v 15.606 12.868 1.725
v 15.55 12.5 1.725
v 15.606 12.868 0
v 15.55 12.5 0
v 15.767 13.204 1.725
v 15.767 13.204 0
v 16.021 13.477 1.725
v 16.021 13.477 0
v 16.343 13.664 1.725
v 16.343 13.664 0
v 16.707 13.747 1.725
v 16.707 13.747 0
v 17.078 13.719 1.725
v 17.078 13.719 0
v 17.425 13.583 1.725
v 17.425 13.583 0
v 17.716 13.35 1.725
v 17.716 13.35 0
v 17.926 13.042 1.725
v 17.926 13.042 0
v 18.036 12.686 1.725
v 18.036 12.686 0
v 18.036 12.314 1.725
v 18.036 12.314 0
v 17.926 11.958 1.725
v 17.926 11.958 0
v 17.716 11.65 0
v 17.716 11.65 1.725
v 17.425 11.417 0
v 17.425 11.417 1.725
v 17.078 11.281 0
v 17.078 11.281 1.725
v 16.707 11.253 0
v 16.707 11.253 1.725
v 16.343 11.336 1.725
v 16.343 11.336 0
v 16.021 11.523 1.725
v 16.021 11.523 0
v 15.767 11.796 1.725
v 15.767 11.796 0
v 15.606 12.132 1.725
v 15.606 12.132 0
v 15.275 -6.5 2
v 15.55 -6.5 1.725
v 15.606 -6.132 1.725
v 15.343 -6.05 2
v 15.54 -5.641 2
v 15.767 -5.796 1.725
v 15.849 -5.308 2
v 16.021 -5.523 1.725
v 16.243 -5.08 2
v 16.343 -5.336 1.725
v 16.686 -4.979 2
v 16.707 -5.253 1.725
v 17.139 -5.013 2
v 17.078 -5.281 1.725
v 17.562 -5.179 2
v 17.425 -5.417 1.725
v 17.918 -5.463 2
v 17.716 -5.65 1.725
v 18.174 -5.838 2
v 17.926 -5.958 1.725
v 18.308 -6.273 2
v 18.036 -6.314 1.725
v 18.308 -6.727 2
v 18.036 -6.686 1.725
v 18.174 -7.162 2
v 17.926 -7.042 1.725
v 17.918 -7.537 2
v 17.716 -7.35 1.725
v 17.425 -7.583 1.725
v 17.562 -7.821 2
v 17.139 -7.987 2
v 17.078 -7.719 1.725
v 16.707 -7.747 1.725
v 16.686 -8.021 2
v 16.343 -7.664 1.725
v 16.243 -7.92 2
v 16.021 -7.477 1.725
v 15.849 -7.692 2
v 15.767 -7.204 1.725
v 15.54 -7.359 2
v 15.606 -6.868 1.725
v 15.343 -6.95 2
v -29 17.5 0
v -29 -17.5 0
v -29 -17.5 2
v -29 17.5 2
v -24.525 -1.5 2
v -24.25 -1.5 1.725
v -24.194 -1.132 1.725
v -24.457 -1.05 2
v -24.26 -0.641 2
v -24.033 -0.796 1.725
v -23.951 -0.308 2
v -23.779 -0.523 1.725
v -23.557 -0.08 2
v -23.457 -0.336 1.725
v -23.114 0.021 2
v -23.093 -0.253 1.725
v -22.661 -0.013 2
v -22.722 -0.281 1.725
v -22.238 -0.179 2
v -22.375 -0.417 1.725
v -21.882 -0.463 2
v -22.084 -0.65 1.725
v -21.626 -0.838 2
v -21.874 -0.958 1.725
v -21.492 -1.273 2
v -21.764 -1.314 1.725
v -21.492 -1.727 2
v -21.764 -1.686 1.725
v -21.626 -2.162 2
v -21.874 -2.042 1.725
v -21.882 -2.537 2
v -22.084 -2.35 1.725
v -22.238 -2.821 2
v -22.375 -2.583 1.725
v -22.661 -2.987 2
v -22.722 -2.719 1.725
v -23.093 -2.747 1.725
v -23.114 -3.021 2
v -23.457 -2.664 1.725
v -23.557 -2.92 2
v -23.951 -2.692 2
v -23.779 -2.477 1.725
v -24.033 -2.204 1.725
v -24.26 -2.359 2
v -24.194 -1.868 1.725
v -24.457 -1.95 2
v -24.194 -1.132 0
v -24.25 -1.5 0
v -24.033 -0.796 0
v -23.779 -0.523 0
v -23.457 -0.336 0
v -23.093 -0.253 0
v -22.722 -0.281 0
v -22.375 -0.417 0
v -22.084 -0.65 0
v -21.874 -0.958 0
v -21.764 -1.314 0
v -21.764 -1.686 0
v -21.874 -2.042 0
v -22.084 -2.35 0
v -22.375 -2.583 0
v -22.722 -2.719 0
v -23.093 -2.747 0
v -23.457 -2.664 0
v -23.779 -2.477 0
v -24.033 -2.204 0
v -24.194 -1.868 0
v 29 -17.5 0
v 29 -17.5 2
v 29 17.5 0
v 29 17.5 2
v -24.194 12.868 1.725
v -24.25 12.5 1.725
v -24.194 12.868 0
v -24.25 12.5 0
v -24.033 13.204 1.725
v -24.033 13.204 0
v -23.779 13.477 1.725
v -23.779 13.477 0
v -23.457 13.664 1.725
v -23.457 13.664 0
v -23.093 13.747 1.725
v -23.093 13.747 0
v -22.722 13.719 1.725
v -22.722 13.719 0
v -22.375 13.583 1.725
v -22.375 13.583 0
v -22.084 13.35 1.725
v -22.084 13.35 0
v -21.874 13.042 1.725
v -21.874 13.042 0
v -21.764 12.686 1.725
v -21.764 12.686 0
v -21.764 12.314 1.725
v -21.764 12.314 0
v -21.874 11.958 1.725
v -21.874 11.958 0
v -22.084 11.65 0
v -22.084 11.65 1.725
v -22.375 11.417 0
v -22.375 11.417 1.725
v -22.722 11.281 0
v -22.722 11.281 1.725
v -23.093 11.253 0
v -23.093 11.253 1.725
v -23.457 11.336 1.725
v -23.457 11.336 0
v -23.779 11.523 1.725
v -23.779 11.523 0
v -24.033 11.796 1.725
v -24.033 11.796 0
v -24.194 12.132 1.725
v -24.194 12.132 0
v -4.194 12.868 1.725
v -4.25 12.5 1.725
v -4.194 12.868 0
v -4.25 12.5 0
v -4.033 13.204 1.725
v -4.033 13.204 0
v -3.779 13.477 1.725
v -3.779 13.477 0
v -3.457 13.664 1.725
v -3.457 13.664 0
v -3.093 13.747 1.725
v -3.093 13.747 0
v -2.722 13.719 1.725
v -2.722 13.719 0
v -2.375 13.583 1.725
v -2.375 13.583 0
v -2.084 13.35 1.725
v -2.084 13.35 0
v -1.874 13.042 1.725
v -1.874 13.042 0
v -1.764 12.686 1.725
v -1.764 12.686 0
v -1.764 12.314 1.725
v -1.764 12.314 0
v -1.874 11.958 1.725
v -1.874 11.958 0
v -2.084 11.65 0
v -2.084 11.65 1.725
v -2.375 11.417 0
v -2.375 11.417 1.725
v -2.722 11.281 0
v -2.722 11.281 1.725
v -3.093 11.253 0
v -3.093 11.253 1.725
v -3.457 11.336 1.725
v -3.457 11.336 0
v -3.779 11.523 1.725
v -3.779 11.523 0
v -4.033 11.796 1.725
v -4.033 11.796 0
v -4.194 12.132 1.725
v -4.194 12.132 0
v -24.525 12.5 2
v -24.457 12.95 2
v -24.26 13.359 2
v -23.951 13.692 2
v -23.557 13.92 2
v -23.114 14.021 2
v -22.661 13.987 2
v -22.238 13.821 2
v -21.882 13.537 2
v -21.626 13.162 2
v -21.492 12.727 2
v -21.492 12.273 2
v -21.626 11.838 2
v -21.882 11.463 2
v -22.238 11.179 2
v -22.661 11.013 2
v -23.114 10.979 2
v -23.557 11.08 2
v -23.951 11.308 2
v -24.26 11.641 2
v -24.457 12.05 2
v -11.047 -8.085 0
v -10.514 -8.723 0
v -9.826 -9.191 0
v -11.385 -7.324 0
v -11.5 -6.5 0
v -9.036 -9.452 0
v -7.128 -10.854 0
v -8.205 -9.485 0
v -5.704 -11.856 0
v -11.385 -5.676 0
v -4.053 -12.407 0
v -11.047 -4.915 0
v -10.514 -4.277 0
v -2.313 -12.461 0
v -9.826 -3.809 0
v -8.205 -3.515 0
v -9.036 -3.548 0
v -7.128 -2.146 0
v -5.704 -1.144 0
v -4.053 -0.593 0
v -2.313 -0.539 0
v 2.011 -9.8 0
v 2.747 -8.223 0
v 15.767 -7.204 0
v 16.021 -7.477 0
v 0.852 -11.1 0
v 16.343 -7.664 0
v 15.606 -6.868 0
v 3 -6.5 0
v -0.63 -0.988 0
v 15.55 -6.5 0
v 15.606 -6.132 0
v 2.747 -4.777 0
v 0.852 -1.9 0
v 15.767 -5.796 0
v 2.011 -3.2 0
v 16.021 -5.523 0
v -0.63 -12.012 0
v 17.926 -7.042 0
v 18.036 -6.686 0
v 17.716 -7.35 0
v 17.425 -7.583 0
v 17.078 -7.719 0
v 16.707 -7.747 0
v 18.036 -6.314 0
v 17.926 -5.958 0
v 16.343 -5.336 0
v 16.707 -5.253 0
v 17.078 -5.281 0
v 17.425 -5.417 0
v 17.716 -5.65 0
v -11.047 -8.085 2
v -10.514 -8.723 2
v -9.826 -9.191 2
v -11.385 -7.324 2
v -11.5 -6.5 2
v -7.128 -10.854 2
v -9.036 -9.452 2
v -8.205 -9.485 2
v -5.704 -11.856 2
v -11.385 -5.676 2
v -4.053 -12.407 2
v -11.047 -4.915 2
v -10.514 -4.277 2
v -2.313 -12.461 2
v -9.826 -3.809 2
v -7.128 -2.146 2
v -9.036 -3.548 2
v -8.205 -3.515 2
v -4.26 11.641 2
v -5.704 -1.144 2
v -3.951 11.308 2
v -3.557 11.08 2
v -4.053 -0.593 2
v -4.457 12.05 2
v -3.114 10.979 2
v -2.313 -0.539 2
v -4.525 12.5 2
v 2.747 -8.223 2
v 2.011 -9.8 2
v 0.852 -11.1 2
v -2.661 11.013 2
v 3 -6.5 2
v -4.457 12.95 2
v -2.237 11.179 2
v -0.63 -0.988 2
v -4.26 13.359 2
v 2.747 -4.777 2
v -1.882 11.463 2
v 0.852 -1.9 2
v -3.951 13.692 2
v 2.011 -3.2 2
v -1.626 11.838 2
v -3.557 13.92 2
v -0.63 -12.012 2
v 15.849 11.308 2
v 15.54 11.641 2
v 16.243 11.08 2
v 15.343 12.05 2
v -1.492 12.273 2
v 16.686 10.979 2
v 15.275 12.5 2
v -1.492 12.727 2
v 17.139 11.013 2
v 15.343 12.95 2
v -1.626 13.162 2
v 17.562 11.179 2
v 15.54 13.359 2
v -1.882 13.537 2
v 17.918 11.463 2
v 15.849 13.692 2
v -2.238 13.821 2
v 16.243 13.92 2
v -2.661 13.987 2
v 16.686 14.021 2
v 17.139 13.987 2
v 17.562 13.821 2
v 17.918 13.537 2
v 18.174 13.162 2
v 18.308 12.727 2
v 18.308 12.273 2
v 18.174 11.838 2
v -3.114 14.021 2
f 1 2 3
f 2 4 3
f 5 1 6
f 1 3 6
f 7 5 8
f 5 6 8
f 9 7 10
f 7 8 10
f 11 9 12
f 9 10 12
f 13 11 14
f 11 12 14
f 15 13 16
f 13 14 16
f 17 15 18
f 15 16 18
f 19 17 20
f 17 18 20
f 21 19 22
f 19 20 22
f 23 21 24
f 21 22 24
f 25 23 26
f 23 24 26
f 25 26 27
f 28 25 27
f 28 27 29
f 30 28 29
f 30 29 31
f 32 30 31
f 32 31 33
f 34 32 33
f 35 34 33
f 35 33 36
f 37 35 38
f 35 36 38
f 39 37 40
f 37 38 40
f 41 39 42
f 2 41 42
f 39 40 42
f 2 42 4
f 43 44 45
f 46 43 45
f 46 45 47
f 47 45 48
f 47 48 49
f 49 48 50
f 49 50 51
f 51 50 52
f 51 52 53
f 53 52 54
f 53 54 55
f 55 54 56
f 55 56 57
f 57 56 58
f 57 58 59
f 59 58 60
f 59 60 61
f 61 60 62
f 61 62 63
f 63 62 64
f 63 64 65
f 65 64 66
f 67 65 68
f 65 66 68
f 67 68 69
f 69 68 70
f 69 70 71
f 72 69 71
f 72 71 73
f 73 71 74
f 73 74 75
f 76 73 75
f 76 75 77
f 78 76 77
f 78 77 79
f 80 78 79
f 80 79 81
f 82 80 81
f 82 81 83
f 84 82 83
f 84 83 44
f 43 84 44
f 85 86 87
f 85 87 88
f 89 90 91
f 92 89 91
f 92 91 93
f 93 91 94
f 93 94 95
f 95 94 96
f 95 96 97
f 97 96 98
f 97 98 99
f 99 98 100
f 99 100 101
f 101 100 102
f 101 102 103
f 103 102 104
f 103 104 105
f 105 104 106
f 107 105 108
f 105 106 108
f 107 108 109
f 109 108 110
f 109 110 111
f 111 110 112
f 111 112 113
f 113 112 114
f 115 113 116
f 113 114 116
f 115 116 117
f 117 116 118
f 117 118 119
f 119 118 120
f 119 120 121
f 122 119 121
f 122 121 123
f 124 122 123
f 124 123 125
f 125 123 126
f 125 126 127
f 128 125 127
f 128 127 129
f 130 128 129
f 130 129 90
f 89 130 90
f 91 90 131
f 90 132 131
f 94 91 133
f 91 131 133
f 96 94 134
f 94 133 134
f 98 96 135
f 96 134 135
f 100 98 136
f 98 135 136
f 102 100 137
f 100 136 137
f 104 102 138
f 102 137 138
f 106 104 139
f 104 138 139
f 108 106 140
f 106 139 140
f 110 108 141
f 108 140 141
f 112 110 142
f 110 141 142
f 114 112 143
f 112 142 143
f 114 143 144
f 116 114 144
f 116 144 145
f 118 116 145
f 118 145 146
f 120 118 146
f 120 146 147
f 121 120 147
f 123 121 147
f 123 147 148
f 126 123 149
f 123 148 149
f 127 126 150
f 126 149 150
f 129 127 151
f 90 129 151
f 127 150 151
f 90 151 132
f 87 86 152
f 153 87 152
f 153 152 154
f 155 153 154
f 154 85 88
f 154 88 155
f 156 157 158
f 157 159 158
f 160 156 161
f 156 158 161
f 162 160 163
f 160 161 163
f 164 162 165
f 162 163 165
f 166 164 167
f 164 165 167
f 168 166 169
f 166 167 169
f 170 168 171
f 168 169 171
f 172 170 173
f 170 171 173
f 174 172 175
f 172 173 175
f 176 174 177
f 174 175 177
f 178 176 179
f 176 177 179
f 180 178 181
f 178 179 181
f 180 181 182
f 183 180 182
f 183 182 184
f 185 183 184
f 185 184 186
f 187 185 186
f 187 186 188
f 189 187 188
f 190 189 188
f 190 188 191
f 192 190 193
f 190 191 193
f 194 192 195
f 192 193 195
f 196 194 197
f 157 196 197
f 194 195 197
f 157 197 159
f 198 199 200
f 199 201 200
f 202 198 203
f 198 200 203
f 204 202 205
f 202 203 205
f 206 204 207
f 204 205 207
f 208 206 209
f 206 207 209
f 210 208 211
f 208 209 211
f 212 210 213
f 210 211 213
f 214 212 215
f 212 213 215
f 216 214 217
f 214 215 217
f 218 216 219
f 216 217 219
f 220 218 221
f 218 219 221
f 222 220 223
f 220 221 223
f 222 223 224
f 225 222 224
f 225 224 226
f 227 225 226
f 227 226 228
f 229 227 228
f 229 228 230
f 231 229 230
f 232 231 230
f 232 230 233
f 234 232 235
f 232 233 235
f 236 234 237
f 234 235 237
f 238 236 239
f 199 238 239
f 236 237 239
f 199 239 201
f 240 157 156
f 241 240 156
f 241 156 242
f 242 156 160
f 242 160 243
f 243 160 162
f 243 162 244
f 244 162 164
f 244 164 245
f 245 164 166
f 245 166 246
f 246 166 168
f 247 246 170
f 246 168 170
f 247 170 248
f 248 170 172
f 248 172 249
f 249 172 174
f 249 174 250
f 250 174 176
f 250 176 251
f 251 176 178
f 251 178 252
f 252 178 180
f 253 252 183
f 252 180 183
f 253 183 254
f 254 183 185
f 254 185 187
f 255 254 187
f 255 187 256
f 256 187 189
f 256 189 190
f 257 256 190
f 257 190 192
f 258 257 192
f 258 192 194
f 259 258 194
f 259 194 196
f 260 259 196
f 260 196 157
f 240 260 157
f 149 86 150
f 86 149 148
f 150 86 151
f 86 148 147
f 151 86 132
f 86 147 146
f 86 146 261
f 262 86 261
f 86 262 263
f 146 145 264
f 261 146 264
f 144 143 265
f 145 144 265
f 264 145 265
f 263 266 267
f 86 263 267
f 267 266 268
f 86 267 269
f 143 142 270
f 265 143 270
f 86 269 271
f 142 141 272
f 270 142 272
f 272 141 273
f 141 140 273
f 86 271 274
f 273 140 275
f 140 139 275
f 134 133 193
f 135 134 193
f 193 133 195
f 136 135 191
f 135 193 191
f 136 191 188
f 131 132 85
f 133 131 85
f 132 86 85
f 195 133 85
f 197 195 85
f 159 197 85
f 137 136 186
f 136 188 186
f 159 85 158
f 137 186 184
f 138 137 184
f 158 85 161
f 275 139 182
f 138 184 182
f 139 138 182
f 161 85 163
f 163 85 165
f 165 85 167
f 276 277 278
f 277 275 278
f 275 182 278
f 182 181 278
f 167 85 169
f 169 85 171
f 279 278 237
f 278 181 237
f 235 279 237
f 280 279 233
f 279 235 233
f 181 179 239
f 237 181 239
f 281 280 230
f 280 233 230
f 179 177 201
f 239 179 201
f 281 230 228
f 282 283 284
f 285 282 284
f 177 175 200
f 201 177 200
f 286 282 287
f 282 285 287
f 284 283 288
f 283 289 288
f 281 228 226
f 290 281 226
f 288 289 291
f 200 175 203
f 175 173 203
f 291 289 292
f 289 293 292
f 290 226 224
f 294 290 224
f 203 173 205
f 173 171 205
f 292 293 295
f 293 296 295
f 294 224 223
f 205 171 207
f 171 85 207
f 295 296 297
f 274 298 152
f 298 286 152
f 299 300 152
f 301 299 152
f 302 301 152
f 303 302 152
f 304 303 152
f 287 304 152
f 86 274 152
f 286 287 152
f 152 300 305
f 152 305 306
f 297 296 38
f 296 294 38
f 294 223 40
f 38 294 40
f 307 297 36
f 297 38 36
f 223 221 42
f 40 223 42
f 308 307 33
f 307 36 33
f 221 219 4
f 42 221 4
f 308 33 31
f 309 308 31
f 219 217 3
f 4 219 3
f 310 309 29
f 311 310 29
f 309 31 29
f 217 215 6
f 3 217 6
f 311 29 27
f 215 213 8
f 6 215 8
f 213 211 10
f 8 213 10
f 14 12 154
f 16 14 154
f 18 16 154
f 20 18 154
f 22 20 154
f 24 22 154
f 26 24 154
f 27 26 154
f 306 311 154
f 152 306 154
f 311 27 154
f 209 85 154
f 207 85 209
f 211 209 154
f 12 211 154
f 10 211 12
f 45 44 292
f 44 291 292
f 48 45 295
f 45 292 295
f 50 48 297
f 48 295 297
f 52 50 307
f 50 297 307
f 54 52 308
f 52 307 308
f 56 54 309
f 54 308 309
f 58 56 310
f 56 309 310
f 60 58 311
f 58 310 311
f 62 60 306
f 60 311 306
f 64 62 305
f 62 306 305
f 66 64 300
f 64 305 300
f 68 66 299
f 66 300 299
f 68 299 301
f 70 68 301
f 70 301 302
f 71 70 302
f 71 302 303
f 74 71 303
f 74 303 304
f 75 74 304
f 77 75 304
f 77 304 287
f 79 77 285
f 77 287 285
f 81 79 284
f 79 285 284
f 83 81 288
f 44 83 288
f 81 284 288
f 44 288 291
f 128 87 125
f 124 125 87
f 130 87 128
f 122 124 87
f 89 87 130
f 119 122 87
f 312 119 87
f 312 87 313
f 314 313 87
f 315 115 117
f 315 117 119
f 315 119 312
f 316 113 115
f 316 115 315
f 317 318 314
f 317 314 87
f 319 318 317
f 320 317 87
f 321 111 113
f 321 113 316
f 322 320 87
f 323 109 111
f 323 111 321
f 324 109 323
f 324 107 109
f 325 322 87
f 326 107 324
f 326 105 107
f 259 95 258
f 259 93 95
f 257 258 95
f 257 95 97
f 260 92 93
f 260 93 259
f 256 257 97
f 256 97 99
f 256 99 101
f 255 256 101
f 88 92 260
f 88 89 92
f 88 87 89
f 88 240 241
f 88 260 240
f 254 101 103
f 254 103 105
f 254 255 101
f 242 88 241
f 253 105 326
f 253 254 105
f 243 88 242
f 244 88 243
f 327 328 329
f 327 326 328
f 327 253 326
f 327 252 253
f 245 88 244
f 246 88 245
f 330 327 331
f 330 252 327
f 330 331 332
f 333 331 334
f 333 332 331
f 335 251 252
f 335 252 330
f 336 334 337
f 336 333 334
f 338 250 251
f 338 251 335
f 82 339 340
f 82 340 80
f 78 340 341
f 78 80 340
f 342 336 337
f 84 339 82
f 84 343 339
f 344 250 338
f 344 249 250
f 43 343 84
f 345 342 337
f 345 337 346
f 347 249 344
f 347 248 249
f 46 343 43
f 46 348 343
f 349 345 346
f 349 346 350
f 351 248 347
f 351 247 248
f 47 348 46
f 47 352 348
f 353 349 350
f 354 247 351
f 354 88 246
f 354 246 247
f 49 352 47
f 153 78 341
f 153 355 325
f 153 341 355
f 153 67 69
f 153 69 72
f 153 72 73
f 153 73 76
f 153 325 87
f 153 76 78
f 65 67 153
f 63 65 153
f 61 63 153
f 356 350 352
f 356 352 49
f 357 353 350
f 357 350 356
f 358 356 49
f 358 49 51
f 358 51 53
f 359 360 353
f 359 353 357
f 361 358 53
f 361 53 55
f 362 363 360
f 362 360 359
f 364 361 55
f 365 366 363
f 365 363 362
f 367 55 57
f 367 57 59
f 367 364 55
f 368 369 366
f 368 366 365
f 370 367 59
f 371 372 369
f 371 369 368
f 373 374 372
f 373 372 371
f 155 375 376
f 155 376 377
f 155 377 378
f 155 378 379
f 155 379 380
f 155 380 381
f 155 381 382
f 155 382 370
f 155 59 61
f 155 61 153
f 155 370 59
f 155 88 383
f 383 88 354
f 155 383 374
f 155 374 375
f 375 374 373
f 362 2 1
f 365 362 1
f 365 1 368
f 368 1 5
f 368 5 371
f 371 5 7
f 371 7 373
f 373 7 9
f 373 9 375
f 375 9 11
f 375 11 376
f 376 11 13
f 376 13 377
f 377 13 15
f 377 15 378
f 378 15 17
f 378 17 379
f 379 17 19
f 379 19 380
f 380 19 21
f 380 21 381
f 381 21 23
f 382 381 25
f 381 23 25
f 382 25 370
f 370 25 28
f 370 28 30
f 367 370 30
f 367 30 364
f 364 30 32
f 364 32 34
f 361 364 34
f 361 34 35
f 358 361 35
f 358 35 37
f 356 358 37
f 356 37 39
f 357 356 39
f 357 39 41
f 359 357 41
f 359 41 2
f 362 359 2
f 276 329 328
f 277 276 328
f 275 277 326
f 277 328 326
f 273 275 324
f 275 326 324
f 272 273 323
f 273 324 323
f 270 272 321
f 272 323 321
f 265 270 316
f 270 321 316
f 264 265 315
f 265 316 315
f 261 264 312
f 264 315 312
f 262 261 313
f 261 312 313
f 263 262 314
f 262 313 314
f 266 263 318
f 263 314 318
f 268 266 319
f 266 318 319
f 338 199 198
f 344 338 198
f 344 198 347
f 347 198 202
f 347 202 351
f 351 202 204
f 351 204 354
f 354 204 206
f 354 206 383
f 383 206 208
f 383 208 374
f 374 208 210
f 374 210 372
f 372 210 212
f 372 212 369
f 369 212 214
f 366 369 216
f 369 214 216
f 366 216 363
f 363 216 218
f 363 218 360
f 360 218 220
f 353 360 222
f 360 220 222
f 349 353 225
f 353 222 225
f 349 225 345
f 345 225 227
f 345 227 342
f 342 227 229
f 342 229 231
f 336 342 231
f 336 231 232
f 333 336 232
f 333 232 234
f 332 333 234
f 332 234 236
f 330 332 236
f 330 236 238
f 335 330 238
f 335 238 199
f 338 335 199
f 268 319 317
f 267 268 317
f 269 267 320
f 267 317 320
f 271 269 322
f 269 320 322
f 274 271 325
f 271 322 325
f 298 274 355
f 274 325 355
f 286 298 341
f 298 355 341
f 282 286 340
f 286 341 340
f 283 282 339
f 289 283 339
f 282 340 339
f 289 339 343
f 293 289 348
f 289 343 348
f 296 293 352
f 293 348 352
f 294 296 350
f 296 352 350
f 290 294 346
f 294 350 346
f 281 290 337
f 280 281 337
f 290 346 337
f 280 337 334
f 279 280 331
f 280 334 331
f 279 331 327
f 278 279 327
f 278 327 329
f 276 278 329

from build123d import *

# Parameters (mm, degrees)
SKETCH1_W                       = 58
SKETCH1_H                       = 35
BOSS_EXTRUDE2_DEPTH             = 2
M3X0_5_TAPPED_HOLE3_D           = 2.5
M3X0_5_TAPPED_HOLE3_CSINK_D     = 3.05
M3X0_5_TAPPED_HOLE3_CSINK_ANGLE = 90
CUT_EXTRUDE1_DEPTH              = 3


with BuildPart() as part:
    # Sketch1 → Boss-Extrude2 (new body)
    with BuildSketch(Plane.XY):
        Rectangle(SKETCH1_W, SKETCH1_H)
    extrude(amount=BOSS_EXTRUDE2_DEPTH)

    # M3x0.5 Tapped Hole3 (through all)
    with Locations(Plane.XY.offset(2)):
        with Locations((-23, 12.5), (-3, 12.5), (16.8, 12.5), (16.8, -6.5), (-23, -1.5)):
            CounterSinkHole(M3X0_5_TAPPED_HOLE3_D / 2, M3X0_5_TAPPED_HOLE3_CSINK_D / 2, counter_sink_angle=M3X0_5_TAPPED_HOLE3_CSINK_ANGLE)

    # Sketch11 → Cut-Extrude1 (cut, through all)
    with BuildSketch(Plane.XY.offset(2)):
        with BuildLine():
            ThreePointArc((-8.204545455, -3.514584349), (-11.5, -6.5), (-8.204545455, -9.485415651))
            ThreePointArc((-8.204545455, -9.485415651), (3, -6.5), (-8.204545455, -3.514584349))
        make_face()
    extrude(amount=-CUT_EXTRUDE1_DEPTH, mode=Mode.SUBTRACT)


solid = part.part
